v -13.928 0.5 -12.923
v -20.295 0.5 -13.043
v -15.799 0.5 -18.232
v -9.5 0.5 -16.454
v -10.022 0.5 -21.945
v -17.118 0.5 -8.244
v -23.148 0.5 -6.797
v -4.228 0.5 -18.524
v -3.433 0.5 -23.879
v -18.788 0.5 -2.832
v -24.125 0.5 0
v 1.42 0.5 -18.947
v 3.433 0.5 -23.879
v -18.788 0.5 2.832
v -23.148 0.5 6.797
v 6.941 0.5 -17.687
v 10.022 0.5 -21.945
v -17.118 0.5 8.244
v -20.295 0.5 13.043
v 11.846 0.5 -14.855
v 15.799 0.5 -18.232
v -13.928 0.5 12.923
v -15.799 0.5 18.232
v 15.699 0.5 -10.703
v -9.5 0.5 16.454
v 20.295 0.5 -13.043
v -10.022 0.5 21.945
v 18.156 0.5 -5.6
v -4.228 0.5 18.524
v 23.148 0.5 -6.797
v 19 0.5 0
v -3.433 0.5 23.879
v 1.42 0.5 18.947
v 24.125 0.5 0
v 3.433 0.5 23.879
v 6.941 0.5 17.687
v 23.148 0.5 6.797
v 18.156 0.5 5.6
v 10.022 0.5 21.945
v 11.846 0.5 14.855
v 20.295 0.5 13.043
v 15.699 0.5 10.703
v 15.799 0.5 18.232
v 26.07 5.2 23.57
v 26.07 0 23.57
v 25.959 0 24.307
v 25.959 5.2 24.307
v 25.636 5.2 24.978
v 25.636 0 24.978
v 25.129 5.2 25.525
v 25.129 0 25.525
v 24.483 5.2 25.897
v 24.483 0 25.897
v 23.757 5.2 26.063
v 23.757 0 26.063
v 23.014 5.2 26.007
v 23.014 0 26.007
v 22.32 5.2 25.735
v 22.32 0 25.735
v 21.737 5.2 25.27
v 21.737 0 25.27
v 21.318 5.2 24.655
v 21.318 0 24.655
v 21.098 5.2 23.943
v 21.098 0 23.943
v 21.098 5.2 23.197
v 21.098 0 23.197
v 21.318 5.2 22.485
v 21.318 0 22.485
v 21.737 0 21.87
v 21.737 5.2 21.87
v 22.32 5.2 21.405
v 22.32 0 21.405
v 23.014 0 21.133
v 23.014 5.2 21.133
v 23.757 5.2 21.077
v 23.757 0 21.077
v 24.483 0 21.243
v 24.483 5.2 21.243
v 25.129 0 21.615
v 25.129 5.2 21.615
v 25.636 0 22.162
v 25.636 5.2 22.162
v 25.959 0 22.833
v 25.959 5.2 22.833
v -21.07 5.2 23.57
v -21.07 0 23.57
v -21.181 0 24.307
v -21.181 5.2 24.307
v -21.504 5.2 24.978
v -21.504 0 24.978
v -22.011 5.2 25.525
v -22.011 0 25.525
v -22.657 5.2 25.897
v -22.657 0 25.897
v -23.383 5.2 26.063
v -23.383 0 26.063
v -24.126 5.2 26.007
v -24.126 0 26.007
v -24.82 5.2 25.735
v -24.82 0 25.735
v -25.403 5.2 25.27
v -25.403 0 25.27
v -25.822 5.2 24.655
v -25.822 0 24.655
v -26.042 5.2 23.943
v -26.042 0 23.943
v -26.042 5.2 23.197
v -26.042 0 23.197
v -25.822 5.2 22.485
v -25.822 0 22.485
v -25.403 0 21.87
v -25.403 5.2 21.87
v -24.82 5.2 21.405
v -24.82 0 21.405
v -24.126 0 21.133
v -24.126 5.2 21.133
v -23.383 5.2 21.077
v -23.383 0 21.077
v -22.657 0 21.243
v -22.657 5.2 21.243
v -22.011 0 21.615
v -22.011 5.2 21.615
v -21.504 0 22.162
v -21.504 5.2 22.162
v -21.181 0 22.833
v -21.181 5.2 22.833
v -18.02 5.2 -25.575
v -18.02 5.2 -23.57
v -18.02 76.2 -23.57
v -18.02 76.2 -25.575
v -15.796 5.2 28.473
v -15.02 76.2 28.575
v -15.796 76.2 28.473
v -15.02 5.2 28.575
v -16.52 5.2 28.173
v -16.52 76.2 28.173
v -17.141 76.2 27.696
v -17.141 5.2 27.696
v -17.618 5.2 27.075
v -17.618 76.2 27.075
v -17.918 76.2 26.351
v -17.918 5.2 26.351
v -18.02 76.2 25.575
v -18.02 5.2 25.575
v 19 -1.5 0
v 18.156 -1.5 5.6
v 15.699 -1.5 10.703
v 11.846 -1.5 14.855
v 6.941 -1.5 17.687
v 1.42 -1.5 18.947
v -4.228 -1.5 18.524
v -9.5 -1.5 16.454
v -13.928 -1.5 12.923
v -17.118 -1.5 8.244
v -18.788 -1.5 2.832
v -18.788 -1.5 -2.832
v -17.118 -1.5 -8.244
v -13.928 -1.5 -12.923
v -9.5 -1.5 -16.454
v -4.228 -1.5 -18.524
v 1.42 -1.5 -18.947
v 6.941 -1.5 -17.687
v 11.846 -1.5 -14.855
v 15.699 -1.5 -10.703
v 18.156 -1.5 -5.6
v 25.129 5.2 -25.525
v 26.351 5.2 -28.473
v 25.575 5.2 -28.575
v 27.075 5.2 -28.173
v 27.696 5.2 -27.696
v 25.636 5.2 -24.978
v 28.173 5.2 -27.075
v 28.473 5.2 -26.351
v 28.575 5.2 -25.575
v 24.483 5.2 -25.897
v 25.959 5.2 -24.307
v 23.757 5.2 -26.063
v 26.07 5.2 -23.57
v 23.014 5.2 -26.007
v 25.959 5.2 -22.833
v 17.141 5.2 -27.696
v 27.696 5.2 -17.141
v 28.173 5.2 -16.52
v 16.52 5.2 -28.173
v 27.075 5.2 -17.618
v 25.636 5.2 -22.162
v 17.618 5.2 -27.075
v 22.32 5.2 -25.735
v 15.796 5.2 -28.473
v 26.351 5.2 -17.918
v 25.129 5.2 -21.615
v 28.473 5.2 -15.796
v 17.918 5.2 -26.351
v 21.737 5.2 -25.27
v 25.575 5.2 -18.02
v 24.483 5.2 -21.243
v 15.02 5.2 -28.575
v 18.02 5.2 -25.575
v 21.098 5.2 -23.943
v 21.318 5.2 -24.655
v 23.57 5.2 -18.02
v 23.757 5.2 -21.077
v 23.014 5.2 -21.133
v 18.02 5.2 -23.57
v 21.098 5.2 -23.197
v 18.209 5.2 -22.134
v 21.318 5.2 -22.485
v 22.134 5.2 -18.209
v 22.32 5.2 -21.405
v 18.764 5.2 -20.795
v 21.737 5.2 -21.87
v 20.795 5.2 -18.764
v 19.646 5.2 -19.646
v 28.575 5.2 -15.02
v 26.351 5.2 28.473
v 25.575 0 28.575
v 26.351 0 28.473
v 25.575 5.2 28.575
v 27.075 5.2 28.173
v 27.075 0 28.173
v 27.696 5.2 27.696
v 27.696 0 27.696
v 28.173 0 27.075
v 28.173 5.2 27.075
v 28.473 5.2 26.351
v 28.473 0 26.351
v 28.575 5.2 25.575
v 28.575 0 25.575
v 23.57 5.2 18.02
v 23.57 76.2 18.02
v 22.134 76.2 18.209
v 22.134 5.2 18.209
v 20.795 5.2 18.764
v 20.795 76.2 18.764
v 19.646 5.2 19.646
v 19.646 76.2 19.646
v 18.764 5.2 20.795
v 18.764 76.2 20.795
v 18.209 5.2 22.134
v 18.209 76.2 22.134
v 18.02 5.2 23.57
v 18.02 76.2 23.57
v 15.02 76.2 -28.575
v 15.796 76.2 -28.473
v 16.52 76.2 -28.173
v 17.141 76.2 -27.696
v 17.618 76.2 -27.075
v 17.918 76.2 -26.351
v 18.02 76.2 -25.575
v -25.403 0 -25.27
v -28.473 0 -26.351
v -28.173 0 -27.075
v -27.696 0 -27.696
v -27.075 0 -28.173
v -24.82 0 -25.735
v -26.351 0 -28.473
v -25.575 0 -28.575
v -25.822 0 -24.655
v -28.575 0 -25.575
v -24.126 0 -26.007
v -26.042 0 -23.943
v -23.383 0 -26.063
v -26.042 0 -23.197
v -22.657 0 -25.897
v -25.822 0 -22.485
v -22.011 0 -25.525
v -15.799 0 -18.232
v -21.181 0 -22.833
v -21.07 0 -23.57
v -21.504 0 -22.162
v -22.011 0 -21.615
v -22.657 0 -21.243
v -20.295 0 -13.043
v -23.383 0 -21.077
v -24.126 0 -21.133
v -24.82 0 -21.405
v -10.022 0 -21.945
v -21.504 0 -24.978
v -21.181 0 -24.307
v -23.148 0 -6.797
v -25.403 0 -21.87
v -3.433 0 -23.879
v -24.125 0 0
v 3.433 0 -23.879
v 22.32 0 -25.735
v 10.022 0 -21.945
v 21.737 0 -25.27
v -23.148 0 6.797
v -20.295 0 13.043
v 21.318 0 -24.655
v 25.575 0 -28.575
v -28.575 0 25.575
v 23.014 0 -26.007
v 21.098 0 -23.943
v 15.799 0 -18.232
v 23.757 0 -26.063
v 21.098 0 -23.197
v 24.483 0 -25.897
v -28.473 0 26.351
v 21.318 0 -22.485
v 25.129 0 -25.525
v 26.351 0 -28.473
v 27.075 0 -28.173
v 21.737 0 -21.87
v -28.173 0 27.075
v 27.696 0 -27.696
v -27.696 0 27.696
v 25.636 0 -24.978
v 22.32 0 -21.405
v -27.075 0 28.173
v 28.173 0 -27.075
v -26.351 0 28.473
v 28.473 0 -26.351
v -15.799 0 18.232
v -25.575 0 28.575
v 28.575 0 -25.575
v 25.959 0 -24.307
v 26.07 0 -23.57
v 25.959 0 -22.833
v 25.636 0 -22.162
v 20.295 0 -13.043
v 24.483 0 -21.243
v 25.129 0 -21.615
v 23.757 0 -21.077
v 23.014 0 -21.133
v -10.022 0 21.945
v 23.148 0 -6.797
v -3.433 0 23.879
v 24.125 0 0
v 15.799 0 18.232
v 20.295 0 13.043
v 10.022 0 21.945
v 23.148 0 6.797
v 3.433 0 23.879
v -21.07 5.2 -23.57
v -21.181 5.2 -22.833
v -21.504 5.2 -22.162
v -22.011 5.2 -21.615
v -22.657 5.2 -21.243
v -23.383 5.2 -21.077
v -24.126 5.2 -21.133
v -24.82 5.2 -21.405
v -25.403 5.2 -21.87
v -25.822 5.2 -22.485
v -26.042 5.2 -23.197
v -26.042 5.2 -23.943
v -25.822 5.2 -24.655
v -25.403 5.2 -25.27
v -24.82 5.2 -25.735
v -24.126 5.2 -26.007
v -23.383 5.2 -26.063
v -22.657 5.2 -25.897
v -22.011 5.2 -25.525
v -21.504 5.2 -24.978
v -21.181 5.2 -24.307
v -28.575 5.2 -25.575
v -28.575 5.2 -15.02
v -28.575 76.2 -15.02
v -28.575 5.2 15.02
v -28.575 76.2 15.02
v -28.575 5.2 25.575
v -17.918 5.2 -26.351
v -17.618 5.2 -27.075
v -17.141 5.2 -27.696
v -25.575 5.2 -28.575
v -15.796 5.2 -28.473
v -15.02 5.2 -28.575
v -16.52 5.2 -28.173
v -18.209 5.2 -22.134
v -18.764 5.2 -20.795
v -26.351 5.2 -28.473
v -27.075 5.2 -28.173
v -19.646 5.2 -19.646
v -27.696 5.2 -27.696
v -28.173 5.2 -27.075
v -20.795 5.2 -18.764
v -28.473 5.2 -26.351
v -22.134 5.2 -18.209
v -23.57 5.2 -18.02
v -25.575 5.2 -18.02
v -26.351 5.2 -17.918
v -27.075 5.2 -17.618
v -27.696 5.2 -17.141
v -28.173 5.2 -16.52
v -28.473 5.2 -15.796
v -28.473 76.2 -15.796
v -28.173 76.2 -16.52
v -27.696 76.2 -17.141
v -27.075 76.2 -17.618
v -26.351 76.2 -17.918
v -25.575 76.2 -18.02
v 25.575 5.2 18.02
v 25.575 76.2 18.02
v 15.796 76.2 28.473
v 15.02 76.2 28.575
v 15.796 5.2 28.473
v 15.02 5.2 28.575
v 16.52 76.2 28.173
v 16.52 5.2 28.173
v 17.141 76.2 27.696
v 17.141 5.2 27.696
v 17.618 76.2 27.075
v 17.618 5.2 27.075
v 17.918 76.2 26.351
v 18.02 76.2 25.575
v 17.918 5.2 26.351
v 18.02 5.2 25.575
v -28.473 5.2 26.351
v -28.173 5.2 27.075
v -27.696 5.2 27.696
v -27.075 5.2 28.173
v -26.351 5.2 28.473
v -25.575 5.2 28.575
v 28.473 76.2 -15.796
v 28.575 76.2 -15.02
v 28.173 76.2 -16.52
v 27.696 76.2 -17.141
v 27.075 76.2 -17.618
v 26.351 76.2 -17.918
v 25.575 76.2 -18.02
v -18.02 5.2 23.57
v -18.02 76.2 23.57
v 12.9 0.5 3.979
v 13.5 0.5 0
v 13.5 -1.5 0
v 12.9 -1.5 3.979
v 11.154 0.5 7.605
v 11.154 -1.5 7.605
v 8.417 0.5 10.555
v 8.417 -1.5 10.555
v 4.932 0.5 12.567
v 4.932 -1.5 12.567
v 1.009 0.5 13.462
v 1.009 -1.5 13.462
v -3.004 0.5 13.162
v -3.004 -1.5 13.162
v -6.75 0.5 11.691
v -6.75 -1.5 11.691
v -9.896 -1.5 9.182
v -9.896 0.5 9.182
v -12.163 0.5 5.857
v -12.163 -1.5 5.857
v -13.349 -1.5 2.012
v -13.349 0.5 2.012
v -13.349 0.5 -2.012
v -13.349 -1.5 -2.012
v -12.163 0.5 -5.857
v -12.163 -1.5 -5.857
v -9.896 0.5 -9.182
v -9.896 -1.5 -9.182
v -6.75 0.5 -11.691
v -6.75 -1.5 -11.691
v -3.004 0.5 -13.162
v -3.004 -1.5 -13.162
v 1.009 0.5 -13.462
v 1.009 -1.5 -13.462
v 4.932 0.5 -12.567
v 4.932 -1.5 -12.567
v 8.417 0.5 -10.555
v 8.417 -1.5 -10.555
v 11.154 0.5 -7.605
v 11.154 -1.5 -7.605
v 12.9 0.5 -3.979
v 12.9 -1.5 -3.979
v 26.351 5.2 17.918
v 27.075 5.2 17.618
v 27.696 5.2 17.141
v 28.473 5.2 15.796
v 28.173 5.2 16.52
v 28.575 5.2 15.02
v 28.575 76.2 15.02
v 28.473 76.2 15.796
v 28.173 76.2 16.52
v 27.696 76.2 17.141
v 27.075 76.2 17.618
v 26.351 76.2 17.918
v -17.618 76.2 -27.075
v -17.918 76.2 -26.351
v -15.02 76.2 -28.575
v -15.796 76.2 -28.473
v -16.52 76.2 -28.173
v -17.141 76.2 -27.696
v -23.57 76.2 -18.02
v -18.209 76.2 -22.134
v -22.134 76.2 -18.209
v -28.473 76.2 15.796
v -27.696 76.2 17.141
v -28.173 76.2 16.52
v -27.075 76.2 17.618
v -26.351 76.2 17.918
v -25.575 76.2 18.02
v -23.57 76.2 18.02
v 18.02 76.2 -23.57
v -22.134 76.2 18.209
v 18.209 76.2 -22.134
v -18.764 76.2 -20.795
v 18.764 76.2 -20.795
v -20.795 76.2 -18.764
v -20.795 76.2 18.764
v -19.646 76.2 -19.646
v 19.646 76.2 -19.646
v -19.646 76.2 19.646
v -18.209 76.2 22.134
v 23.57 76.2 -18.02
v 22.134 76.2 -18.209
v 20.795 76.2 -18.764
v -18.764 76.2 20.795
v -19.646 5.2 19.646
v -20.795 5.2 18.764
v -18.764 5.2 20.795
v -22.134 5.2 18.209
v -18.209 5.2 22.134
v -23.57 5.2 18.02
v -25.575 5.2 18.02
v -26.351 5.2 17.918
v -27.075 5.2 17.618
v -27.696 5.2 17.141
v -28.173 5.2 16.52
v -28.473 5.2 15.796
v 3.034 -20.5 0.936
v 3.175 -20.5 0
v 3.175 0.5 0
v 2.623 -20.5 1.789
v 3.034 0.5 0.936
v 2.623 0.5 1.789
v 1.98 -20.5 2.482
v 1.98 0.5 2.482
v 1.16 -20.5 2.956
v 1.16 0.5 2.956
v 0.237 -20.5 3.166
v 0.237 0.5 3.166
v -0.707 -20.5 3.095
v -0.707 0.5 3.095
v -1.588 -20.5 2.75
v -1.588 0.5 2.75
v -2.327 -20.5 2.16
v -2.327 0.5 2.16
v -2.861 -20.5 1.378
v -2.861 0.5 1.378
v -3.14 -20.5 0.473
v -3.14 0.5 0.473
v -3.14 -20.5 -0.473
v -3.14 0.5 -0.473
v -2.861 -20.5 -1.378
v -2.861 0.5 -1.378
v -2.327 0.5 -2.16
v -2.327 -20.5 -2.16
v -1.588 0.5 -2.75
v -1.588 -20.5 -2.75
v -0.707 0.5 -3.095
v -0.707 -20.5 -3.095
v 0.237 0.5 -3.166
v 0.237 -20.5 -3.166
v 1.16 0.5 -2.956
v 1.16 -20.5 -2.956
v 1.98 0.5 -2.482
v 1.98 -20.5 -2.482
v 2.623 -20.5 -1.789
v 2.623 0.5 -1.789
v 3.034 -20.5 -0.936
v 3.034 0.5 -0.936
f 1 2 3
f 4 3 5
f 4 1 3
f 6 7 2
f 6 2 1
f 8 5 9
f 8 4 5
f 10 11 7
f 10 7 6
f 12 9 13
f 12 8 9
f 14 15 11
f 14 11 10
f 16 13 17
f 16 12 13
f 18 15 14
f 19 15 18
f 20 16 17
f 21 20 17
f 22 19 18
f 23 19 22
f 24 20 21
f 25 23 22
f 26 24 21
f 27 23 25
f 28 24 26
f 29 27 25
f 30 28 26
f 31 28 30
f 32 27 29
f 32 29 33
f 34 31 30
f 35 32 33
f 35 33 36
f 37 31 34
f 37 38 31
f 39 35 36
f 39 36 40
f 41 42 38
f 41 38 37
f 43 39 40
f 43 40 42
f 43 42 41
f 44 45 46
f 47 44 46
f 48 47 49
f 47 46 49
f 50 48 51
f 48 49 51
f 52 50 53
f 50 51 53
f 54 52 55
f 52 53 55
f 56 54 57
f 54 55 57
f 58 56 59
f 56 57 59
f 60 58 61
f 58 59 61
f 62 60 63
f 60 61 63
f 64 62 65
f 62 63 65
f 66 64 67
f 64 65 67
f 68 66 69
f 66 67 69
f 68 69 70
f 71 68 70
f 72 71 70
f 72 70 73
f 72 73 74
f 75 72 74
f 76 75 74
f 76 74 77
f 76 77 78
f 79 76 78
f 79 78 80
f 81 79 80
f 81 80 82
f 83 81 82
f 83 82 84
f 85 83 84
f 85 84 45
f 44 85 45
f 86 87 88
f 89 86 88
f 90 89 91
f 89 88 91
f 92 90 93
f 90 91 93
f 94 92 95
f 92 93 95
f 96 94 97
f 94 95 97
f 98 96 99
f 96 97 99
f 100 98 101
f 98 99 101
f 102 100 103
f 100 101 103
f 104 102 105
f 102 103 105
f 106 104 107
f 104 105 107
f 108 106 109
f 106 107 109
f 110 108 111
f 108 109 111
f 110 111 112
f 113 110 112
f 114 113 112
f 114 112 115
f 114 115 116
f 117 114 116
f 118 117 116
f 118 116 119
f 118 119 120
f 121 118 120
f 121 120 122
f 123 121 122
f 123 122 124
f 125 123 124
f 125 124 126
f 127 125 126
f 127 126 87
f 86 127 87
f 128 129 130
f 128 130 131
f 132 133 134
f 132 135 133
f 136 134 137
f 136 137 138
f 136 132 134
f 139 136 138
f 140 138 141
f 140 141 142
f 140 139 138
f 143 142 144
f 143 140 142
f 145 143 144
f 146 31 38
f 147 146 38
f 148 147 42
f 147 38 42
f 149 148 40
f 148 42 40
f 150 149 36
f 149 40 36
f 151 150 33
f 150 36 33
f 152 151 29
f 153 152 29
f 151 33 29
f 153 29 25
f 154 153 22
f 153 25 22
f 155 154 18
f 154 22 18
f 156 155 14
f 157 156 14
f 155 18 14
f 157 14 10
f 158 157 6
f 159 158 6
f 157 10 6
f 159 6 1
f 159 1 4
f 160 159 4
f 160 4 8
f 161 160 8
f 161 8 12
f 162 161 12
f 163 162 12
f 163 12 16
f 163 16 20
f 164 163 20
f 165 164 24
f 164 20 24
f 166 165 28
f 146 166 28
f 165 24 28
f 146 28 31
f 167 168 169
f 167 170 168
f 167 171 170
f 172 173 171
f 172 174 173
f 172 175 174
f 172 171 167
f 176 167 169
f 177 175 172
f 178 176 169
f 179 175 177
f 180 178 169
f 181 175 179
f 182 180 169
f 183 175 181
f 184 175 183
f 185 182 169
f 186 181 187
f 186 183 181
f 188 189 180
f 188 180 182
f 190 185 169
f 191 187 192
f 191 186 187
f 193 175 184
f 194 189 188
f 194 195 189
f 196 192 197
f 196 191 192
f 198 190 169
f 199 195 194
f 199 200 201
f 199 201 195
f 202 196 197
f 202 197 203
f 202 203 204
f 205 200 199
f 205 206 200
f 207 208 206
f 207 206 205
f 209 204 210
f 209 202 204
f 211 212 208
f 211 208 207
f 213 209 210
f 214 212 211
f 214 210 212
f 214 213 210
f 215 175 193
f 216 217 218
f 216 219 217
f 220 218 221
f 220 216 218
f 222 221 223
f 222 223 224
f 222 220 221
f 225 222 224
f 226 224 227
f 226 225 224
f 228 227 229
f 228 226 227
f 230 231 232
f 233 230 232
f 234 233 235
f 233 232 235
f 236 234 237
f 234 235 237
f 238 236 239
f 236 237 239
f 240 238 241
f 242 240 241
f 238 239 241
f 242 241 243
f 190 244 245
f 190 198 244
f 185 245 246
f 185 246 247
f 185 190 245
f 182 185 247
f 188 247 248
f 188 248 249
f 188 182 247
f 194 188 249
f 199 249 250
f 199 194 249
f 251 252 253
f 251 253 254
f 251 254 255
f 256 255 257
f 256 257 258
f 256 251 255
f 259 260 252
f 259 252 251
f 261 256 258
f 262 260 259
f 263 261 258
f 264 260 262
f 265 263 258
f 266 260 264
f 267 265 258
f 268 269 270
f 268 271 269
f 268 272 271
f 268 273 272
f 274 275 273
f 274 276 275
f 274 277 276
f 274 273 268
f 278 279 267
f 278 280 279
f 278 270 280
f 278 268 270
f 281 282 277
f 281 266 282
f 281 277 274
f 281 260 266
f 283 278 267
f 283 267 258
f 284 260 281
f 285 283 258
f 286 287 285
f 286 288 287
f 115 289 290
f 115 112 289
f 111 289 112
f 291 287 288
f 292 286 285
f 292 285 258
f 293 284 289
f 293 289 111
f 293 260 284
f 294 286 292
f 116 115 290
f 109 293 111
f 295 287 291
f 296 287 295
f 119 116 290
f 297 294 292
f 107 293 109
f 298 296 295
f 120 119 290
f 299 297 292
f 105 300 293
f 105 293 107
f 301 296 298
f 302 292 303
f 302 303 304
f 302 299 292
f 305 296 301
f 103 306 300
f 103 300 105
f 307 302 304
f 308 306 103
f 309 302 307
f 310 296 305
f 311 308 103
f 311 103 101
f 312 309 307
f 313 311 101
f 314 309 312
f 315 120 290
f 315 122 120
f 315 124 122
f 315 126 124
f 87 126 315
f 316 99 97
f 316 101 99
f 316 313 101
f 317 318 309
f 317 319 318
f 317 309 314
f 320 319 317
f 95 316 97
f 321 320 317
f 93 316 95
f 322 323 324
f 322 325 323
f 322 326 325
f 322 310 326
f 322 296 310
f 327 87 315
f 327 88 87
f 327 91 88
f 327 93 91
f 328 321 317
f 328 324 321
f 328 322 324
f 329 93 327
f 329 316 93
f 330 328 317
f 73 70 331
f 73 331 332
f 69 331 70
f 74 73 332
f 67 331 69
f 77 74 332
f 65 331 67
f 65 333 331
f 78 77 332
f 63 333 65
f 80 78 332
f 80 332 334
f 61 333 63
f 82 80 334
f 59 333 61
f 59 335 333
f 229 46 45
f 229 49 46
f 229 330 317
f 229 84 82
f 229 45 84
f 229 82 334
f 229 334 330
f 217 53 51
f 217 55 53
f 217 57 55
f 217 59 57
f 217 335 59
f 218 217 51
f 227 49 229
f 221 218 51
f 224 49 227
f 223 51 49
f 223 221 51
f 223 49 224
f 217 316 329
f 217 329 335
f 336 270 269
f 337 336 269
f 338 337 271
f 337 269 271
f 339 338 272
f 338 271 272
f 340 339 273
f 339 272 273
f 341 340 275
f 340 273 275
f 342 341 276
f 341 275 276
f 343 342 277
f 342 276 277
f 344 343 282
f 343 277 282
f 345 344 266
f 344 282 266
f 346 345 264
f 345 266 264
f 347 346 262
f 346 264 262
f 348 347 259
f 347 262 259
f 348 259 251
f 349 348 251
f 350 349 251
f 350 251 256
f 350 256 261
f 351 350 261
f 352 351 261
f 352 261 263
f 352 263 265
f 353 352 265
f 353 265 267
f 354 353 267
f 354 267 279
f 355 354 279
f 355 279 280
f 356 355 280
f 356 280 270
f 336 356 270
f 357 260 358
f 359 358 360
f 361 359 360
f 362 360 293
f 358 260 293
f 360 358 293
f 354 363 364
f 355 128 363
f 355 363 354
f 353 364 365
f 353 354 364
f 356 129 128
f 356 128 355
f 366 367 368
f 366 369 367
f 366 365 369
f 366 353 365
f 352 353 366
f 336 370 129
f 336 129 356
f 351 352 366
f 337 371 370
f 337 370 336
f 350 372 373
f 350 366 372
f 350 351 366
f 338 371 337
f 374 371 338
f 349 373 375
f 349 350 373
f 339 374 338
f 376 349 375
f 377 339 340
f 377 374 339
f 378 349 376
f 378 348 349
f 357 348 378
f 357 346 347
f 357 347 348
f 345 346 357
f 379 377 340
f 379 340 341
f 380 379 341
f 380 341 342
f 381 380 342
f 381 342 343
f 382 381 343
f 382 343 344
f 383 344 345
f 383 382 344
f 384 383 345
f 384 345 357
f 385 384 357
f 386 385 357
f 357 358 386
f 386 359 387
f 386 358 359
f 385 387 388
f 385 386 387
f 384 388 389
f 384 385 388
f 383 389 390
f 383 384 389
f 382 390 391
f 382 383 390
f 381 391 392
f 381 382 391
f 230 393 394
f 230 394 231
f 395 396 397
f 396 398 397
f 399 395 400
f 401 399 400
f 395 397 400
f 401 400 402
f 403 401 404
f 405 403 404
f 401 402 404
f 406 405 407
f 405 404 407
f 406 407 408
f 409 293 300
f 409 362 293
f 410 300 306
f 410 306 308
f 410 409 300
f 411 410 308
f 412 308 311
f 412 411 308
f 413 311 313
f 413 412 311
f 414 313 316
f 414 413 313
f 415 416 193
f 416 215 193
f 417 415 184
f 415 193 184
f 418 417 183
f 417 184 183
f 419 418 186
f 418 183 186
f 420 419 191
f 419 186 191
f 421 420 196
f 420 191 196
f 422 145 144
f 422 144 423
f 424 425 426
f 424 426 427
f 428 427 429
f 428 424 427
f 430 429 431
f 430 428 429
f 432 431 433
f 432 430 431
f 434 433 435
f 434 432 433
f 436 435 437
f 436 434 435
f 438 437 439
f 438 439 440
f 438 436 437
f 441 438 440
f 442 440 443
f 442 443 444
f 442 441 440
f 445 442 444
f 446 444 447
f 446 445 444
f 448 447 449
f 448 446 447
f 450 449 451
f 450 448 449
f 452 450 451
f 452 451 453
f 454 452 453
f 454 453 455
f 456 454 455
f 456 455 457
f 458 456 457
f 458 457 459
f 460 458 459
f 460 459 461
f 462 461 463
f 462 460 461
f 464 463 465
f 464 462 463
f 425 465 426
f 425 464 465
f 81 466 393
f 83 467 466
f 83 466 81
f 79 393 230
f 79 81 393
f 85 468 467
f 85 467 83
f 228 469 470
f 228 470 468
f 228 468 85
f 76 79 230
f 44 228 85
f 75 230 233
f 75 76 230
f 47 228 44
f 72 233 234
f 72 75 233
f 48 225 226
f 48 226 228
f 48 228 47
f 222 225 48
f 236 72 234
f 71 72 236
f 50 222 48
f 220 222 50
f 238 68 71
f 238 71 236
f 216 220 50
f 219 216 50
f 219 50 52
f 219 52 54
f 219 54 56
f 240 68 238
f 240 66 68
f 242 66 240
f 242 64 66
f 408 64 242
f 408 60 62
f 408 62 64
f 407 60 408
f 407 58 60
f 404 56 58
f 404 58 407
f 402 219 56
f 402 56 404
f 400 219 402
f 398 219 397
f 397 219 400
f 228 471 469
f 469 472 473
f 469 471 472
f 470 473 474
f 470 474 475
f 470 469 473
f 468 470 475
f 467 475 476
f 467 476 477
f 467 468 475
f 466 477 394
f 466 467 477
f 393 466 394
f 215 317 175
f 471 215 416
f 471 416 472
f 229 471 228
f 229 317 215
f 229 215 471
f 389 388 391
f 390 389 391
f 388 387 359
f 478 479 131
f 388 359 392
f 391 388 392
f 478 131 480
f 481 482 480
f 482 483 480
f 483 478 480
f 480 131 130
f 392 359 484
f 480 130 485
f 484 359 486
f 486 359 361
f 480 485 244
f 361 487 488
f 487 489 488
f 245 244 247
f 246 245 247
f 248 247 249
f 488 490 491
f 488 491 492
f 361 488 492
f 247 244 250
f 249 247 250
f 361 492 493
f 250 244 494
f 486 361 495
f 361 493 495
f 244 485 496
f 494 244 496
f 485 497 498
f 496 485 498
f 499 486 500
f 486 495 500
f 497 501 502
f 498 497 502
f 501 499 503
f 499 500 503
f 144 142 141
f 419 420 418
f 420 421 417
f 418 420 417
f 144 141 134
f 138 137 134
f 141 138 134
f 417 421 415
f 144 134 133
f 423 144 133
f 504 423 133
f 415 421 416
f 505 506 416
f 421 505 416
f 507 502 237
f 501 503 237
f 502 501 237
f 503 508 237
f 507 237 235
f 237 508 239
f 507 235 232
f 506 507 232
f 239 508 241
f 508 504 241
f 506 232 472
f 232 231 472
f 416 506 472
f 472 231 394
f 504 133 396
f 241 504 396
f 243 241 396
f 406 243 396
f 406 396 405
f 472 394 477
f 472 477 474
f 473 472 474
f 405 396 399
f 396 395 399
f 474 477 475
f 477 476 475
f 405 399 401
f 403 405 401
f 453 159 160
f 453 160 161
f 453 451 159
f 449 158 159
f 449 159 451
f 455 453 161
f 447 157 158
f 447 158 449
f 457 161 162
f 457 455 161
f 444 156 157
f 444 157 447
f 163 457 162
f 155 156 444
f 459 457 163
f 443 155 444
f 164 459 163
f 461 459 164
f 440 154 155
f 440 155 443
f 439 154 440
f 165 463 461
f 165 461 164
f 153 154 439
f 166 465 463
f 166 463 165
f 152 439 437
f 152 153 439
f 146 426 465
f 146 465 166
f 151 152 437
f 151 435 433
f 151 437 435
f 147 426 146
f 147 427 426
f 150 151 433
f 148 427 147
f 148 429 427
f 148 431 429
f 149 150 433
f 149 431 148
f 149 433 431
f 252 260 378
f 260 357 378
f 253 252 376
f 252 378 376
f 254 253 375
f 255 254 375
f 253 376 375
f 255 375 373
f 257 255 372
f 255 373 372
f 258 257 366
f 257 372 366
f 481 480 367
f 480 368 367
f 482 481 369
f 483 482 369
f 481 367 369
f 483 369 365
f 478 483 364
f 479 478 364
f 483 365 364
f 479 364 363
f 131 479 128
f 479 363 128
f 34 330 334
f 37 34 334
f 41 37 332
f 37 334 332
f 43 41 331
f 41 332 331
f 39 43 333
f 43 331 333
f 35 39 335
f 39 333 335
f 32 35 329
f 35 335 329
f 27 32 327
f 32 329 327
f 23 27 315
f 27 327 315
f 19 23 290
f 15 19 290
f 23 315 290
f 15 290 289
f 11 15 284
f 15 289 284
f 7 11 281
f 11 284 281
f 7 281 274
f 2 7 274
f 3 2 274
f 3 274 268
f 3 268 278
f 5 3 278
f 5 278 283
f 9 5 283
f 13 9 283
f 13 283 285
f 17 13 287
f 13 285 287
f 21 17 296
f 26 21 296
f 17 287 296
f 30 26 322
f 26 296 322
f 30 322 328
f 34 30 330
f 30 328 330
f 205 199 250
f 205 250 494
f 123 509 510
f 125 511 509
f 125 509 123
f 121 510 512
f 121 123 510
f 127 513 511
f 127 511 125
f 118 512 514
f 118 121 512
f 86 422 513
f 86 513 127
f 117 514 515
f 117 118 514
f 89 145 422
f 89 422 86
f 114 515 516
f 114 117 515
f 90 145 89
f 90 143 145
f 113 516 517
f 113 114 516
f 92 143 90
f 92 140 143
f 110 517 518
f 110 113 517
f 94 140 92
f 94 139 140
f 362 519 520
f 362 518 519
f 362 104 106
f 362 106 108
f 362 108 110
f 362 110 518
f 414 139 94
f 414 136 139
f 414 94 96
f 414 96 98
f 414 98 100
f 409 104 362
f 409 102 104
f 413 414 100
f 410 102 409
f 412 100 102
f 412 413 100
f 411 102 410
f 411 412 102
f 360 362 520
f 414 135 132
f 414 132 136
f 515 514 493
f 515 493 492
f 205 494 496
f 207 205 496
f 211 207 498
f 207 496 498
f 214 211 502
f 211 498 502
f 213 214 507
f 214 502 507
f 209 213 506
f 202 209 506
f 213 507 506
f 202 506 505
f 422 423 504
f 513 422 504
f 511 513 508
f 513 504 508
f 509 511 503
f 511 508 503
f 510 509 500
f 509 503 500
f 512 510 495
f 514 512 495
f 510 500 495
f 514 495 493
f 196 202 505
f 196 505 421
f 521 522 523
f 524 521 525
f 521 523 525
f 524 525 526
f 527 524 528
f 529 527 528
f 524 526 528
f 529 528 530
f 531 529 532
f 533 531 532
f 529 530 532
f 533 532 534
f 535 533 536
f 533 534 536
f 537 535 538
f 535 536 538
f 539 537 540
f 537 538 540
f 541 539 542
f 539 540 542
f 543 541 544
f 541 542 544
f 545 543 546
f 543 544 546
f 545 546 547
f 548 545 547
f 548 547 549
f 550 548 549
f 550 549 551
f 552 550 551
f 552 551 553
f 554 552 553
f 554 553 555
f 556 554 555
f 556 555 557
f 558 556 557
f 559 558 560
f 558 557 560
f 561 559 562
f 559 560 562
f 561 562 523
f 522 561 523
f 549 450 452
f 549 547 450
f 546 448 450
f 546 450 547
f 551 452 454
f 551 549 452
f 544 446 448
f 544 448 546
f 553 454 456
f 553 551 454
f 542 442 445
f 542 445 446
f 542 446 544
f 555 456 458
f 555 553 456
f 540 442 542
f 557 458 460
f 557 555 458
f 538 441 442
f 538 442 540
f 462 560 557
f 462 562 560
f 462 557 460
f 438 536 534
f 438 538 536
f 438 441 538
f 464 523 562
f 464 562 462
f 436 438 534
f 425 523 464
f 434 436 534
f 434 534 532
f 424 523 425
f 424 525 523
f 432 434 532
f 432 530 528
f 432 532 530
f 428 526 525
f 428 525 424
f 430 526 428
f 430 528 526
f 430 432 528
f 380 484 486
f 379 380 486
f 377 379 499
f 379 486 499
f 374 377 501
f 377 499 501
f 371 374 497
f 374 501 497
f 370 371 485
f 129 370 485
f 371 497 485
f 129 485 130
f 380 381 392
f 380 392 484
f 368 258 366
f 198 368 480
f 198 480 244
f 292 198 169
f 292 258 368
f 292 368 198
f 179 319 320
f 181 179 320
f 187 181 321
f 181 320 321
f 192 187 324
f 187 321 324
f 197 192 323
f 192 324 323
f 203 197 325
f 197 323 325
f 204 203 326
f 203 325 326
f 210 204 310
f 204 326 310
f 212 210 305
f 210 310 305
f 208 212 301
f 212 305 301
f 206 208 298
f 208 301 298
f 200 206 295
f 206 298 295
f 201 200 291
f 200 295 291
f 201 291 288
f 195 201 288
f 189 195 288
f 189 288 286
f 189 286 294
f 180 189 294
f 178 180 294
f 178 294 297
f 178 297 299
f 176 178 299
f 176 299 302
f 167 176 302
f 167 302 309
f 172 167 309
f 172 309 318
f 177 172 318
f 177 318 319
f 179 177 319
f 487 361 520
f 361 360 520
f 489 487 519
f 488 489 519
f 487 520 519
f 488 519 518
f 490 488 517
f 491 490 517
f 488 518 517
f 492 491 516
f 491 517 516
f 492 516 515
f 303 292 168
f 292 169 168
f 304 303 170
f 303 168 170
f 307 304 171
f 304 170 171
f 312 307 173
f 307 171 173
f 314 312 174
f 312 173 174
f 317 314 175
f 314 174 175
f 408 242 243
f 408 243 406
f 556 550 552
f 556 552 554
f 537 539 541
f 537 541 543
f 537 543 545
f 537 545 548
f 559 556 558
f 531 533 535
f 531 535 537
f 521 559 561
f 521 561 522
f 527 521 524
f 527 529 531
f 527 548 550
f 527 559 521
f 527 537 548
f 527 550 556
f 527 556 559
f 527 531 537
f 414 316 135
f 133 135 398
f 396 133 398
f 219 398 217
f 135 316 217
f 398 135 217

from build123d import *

# Parameters (mm, degrees)
F0_W      = 57.15
F0_H      = 57.15
F1_DEPTH  = 76.2
F2_R      = 2.5
F3_DEPTH  = 76.201
F5_DEPTH  = 71
F6_R      = 3
F7_R      = 24.125
F8_DEPTH  = 0.5
F9_R      = 19
F9_R_2    = 13.5
F10_DEPTH = 2
F11_R     = 3.175
F12_DEPTH = 21


with BuildPart() as f1:
    # F0 (on Front) → F1 (new body)
    with BuildSketch(Plane.XZ):
        Rectangle(F0_W, F0_H)
    extrude(amount=-F1_DEPTH)

    # F2 (on face) → F3 (cut, through all)
    with BuildSketch(Plane.XZ):
        with Locations((-23.57, 23.57)):
            Circle(F2_R)
        with Locations((23.57, 23.57)):
            Circle(F2_R)
        with Locations((-23.57, -23.57)):
            Circle(F2_R)
        with Locations((23.57, -23.57)):
            Circle(F2_R)
    extrude(amount=-F3_DEPTH, mode=Mode.SUBTRACT)

    # F4 (on face) → F5 (cut)
    with BuildSketch(Plane(origin=(0, 76.2, 0), x_dir=(-1, 0, 0), z_dir=(0, 1, 0))):
        with BuildLine():
            Line((-28.575, 18.02), (-23.57, 18.02))
            ThreePointArc((-23.57, 18.02), (-19.6455573644, 19.6455573644), (-18.02, 23.57))
            Line((-18.02, 23.57), (-18.02, 28.575))
            Line((-18.02, 28.575), (-28.575, 28.575))
            Line((-28.575, 28.575), (-28.575, 18.02))
        make_face()
        with BuildLine():
            Line((18.02, 28.575), (18.02, 23.57))
            ThreePointArc((18.02, 23.57), (19.6455573644, 19.6455573644), (23.57, 18.02))
            Line((23.57, 18.02), (28.575, 18.02))
            Line((28.575, 18.02), (28.575, 28.575))
            Line((28.575, 28.575), (18.02, 28.575))
        make_face()
        with BuildLine():
            ThreePointArc((23.57, -18.02), (19.6455573644, -19.6455573644), (18.02, -23.57))
            Line((18.02, -23.57), (18.02, -28.575))
            Line((18.02, -28.575), (28.575, -28.575))
            Line((28.575, -28.575), (28.575, -18.02))
            Line((28.575, -18.02), (23.57, -18.02))
        make_face()
        with BuildLine():
            ThreePointArc((-18.02, -23.57), (-19.6455573644, -19.6455573644), (-23.57, -18.02))
            Line((-23.57, -18.02), (-28.575, -18.02))
            Line((-28.575, -18.02), (-28.575, -28.575))
            Line((-28.575, -28.575), (-18.02, -28.575))
            Line((-18.02, -28.575), (-18.02, -23.57))
        make_face()
    extrude(amount=-F5_DEPTH, mode=Mode.SUBTRACT)

    # F6
    f6_edges = [f1.edges().sort_by_distance(p)[0] for p in [
        (-18.02, 40.7, 28.575),
        (-28.575, 40.7, 18.02),
        (-28.575, 2.6, 28.575),
        (28.575, 2.6, 28.575),
        (18.02, 40.7, 28.575),
        (28.575, 40.7, 18.02),
        (-28.575, 2.6, -28.575),
        (-28.575, 40.7, -18.02),
        (-18.02, 40.7, -28.575),
        (28.575, 2.6, -28.575),
        (28.575, 40.7, -18.02),
        (18.02, 40.7, -28.575),
    ]]
    fillet(f6_edges, radius=F6_R)

    # F7 (on face) → F8 (cut)
    with BuildSketch(Plane.XZ):
        Circle(F7_R)
    extrude(amount=-F8_DEPTH, mode=Mode.SUBTRACT)

    # F9 (on face) → F10 (join)
    with BuildSketch(Plane.XZ.offset(-0.5)):
        Circle(F9_R)
        Circle(F9_R_2, mode=Mode.SUBTRACT)
    extrude(amount=F10_DEPTH)

    # F11 (on face) → F12 (join)
    with BuildSketch(Plane.XZ.offset(-0.5)):
        Circle(F11_R)
    extrude(amount=F12_DEPTH)


solid = f1.part
